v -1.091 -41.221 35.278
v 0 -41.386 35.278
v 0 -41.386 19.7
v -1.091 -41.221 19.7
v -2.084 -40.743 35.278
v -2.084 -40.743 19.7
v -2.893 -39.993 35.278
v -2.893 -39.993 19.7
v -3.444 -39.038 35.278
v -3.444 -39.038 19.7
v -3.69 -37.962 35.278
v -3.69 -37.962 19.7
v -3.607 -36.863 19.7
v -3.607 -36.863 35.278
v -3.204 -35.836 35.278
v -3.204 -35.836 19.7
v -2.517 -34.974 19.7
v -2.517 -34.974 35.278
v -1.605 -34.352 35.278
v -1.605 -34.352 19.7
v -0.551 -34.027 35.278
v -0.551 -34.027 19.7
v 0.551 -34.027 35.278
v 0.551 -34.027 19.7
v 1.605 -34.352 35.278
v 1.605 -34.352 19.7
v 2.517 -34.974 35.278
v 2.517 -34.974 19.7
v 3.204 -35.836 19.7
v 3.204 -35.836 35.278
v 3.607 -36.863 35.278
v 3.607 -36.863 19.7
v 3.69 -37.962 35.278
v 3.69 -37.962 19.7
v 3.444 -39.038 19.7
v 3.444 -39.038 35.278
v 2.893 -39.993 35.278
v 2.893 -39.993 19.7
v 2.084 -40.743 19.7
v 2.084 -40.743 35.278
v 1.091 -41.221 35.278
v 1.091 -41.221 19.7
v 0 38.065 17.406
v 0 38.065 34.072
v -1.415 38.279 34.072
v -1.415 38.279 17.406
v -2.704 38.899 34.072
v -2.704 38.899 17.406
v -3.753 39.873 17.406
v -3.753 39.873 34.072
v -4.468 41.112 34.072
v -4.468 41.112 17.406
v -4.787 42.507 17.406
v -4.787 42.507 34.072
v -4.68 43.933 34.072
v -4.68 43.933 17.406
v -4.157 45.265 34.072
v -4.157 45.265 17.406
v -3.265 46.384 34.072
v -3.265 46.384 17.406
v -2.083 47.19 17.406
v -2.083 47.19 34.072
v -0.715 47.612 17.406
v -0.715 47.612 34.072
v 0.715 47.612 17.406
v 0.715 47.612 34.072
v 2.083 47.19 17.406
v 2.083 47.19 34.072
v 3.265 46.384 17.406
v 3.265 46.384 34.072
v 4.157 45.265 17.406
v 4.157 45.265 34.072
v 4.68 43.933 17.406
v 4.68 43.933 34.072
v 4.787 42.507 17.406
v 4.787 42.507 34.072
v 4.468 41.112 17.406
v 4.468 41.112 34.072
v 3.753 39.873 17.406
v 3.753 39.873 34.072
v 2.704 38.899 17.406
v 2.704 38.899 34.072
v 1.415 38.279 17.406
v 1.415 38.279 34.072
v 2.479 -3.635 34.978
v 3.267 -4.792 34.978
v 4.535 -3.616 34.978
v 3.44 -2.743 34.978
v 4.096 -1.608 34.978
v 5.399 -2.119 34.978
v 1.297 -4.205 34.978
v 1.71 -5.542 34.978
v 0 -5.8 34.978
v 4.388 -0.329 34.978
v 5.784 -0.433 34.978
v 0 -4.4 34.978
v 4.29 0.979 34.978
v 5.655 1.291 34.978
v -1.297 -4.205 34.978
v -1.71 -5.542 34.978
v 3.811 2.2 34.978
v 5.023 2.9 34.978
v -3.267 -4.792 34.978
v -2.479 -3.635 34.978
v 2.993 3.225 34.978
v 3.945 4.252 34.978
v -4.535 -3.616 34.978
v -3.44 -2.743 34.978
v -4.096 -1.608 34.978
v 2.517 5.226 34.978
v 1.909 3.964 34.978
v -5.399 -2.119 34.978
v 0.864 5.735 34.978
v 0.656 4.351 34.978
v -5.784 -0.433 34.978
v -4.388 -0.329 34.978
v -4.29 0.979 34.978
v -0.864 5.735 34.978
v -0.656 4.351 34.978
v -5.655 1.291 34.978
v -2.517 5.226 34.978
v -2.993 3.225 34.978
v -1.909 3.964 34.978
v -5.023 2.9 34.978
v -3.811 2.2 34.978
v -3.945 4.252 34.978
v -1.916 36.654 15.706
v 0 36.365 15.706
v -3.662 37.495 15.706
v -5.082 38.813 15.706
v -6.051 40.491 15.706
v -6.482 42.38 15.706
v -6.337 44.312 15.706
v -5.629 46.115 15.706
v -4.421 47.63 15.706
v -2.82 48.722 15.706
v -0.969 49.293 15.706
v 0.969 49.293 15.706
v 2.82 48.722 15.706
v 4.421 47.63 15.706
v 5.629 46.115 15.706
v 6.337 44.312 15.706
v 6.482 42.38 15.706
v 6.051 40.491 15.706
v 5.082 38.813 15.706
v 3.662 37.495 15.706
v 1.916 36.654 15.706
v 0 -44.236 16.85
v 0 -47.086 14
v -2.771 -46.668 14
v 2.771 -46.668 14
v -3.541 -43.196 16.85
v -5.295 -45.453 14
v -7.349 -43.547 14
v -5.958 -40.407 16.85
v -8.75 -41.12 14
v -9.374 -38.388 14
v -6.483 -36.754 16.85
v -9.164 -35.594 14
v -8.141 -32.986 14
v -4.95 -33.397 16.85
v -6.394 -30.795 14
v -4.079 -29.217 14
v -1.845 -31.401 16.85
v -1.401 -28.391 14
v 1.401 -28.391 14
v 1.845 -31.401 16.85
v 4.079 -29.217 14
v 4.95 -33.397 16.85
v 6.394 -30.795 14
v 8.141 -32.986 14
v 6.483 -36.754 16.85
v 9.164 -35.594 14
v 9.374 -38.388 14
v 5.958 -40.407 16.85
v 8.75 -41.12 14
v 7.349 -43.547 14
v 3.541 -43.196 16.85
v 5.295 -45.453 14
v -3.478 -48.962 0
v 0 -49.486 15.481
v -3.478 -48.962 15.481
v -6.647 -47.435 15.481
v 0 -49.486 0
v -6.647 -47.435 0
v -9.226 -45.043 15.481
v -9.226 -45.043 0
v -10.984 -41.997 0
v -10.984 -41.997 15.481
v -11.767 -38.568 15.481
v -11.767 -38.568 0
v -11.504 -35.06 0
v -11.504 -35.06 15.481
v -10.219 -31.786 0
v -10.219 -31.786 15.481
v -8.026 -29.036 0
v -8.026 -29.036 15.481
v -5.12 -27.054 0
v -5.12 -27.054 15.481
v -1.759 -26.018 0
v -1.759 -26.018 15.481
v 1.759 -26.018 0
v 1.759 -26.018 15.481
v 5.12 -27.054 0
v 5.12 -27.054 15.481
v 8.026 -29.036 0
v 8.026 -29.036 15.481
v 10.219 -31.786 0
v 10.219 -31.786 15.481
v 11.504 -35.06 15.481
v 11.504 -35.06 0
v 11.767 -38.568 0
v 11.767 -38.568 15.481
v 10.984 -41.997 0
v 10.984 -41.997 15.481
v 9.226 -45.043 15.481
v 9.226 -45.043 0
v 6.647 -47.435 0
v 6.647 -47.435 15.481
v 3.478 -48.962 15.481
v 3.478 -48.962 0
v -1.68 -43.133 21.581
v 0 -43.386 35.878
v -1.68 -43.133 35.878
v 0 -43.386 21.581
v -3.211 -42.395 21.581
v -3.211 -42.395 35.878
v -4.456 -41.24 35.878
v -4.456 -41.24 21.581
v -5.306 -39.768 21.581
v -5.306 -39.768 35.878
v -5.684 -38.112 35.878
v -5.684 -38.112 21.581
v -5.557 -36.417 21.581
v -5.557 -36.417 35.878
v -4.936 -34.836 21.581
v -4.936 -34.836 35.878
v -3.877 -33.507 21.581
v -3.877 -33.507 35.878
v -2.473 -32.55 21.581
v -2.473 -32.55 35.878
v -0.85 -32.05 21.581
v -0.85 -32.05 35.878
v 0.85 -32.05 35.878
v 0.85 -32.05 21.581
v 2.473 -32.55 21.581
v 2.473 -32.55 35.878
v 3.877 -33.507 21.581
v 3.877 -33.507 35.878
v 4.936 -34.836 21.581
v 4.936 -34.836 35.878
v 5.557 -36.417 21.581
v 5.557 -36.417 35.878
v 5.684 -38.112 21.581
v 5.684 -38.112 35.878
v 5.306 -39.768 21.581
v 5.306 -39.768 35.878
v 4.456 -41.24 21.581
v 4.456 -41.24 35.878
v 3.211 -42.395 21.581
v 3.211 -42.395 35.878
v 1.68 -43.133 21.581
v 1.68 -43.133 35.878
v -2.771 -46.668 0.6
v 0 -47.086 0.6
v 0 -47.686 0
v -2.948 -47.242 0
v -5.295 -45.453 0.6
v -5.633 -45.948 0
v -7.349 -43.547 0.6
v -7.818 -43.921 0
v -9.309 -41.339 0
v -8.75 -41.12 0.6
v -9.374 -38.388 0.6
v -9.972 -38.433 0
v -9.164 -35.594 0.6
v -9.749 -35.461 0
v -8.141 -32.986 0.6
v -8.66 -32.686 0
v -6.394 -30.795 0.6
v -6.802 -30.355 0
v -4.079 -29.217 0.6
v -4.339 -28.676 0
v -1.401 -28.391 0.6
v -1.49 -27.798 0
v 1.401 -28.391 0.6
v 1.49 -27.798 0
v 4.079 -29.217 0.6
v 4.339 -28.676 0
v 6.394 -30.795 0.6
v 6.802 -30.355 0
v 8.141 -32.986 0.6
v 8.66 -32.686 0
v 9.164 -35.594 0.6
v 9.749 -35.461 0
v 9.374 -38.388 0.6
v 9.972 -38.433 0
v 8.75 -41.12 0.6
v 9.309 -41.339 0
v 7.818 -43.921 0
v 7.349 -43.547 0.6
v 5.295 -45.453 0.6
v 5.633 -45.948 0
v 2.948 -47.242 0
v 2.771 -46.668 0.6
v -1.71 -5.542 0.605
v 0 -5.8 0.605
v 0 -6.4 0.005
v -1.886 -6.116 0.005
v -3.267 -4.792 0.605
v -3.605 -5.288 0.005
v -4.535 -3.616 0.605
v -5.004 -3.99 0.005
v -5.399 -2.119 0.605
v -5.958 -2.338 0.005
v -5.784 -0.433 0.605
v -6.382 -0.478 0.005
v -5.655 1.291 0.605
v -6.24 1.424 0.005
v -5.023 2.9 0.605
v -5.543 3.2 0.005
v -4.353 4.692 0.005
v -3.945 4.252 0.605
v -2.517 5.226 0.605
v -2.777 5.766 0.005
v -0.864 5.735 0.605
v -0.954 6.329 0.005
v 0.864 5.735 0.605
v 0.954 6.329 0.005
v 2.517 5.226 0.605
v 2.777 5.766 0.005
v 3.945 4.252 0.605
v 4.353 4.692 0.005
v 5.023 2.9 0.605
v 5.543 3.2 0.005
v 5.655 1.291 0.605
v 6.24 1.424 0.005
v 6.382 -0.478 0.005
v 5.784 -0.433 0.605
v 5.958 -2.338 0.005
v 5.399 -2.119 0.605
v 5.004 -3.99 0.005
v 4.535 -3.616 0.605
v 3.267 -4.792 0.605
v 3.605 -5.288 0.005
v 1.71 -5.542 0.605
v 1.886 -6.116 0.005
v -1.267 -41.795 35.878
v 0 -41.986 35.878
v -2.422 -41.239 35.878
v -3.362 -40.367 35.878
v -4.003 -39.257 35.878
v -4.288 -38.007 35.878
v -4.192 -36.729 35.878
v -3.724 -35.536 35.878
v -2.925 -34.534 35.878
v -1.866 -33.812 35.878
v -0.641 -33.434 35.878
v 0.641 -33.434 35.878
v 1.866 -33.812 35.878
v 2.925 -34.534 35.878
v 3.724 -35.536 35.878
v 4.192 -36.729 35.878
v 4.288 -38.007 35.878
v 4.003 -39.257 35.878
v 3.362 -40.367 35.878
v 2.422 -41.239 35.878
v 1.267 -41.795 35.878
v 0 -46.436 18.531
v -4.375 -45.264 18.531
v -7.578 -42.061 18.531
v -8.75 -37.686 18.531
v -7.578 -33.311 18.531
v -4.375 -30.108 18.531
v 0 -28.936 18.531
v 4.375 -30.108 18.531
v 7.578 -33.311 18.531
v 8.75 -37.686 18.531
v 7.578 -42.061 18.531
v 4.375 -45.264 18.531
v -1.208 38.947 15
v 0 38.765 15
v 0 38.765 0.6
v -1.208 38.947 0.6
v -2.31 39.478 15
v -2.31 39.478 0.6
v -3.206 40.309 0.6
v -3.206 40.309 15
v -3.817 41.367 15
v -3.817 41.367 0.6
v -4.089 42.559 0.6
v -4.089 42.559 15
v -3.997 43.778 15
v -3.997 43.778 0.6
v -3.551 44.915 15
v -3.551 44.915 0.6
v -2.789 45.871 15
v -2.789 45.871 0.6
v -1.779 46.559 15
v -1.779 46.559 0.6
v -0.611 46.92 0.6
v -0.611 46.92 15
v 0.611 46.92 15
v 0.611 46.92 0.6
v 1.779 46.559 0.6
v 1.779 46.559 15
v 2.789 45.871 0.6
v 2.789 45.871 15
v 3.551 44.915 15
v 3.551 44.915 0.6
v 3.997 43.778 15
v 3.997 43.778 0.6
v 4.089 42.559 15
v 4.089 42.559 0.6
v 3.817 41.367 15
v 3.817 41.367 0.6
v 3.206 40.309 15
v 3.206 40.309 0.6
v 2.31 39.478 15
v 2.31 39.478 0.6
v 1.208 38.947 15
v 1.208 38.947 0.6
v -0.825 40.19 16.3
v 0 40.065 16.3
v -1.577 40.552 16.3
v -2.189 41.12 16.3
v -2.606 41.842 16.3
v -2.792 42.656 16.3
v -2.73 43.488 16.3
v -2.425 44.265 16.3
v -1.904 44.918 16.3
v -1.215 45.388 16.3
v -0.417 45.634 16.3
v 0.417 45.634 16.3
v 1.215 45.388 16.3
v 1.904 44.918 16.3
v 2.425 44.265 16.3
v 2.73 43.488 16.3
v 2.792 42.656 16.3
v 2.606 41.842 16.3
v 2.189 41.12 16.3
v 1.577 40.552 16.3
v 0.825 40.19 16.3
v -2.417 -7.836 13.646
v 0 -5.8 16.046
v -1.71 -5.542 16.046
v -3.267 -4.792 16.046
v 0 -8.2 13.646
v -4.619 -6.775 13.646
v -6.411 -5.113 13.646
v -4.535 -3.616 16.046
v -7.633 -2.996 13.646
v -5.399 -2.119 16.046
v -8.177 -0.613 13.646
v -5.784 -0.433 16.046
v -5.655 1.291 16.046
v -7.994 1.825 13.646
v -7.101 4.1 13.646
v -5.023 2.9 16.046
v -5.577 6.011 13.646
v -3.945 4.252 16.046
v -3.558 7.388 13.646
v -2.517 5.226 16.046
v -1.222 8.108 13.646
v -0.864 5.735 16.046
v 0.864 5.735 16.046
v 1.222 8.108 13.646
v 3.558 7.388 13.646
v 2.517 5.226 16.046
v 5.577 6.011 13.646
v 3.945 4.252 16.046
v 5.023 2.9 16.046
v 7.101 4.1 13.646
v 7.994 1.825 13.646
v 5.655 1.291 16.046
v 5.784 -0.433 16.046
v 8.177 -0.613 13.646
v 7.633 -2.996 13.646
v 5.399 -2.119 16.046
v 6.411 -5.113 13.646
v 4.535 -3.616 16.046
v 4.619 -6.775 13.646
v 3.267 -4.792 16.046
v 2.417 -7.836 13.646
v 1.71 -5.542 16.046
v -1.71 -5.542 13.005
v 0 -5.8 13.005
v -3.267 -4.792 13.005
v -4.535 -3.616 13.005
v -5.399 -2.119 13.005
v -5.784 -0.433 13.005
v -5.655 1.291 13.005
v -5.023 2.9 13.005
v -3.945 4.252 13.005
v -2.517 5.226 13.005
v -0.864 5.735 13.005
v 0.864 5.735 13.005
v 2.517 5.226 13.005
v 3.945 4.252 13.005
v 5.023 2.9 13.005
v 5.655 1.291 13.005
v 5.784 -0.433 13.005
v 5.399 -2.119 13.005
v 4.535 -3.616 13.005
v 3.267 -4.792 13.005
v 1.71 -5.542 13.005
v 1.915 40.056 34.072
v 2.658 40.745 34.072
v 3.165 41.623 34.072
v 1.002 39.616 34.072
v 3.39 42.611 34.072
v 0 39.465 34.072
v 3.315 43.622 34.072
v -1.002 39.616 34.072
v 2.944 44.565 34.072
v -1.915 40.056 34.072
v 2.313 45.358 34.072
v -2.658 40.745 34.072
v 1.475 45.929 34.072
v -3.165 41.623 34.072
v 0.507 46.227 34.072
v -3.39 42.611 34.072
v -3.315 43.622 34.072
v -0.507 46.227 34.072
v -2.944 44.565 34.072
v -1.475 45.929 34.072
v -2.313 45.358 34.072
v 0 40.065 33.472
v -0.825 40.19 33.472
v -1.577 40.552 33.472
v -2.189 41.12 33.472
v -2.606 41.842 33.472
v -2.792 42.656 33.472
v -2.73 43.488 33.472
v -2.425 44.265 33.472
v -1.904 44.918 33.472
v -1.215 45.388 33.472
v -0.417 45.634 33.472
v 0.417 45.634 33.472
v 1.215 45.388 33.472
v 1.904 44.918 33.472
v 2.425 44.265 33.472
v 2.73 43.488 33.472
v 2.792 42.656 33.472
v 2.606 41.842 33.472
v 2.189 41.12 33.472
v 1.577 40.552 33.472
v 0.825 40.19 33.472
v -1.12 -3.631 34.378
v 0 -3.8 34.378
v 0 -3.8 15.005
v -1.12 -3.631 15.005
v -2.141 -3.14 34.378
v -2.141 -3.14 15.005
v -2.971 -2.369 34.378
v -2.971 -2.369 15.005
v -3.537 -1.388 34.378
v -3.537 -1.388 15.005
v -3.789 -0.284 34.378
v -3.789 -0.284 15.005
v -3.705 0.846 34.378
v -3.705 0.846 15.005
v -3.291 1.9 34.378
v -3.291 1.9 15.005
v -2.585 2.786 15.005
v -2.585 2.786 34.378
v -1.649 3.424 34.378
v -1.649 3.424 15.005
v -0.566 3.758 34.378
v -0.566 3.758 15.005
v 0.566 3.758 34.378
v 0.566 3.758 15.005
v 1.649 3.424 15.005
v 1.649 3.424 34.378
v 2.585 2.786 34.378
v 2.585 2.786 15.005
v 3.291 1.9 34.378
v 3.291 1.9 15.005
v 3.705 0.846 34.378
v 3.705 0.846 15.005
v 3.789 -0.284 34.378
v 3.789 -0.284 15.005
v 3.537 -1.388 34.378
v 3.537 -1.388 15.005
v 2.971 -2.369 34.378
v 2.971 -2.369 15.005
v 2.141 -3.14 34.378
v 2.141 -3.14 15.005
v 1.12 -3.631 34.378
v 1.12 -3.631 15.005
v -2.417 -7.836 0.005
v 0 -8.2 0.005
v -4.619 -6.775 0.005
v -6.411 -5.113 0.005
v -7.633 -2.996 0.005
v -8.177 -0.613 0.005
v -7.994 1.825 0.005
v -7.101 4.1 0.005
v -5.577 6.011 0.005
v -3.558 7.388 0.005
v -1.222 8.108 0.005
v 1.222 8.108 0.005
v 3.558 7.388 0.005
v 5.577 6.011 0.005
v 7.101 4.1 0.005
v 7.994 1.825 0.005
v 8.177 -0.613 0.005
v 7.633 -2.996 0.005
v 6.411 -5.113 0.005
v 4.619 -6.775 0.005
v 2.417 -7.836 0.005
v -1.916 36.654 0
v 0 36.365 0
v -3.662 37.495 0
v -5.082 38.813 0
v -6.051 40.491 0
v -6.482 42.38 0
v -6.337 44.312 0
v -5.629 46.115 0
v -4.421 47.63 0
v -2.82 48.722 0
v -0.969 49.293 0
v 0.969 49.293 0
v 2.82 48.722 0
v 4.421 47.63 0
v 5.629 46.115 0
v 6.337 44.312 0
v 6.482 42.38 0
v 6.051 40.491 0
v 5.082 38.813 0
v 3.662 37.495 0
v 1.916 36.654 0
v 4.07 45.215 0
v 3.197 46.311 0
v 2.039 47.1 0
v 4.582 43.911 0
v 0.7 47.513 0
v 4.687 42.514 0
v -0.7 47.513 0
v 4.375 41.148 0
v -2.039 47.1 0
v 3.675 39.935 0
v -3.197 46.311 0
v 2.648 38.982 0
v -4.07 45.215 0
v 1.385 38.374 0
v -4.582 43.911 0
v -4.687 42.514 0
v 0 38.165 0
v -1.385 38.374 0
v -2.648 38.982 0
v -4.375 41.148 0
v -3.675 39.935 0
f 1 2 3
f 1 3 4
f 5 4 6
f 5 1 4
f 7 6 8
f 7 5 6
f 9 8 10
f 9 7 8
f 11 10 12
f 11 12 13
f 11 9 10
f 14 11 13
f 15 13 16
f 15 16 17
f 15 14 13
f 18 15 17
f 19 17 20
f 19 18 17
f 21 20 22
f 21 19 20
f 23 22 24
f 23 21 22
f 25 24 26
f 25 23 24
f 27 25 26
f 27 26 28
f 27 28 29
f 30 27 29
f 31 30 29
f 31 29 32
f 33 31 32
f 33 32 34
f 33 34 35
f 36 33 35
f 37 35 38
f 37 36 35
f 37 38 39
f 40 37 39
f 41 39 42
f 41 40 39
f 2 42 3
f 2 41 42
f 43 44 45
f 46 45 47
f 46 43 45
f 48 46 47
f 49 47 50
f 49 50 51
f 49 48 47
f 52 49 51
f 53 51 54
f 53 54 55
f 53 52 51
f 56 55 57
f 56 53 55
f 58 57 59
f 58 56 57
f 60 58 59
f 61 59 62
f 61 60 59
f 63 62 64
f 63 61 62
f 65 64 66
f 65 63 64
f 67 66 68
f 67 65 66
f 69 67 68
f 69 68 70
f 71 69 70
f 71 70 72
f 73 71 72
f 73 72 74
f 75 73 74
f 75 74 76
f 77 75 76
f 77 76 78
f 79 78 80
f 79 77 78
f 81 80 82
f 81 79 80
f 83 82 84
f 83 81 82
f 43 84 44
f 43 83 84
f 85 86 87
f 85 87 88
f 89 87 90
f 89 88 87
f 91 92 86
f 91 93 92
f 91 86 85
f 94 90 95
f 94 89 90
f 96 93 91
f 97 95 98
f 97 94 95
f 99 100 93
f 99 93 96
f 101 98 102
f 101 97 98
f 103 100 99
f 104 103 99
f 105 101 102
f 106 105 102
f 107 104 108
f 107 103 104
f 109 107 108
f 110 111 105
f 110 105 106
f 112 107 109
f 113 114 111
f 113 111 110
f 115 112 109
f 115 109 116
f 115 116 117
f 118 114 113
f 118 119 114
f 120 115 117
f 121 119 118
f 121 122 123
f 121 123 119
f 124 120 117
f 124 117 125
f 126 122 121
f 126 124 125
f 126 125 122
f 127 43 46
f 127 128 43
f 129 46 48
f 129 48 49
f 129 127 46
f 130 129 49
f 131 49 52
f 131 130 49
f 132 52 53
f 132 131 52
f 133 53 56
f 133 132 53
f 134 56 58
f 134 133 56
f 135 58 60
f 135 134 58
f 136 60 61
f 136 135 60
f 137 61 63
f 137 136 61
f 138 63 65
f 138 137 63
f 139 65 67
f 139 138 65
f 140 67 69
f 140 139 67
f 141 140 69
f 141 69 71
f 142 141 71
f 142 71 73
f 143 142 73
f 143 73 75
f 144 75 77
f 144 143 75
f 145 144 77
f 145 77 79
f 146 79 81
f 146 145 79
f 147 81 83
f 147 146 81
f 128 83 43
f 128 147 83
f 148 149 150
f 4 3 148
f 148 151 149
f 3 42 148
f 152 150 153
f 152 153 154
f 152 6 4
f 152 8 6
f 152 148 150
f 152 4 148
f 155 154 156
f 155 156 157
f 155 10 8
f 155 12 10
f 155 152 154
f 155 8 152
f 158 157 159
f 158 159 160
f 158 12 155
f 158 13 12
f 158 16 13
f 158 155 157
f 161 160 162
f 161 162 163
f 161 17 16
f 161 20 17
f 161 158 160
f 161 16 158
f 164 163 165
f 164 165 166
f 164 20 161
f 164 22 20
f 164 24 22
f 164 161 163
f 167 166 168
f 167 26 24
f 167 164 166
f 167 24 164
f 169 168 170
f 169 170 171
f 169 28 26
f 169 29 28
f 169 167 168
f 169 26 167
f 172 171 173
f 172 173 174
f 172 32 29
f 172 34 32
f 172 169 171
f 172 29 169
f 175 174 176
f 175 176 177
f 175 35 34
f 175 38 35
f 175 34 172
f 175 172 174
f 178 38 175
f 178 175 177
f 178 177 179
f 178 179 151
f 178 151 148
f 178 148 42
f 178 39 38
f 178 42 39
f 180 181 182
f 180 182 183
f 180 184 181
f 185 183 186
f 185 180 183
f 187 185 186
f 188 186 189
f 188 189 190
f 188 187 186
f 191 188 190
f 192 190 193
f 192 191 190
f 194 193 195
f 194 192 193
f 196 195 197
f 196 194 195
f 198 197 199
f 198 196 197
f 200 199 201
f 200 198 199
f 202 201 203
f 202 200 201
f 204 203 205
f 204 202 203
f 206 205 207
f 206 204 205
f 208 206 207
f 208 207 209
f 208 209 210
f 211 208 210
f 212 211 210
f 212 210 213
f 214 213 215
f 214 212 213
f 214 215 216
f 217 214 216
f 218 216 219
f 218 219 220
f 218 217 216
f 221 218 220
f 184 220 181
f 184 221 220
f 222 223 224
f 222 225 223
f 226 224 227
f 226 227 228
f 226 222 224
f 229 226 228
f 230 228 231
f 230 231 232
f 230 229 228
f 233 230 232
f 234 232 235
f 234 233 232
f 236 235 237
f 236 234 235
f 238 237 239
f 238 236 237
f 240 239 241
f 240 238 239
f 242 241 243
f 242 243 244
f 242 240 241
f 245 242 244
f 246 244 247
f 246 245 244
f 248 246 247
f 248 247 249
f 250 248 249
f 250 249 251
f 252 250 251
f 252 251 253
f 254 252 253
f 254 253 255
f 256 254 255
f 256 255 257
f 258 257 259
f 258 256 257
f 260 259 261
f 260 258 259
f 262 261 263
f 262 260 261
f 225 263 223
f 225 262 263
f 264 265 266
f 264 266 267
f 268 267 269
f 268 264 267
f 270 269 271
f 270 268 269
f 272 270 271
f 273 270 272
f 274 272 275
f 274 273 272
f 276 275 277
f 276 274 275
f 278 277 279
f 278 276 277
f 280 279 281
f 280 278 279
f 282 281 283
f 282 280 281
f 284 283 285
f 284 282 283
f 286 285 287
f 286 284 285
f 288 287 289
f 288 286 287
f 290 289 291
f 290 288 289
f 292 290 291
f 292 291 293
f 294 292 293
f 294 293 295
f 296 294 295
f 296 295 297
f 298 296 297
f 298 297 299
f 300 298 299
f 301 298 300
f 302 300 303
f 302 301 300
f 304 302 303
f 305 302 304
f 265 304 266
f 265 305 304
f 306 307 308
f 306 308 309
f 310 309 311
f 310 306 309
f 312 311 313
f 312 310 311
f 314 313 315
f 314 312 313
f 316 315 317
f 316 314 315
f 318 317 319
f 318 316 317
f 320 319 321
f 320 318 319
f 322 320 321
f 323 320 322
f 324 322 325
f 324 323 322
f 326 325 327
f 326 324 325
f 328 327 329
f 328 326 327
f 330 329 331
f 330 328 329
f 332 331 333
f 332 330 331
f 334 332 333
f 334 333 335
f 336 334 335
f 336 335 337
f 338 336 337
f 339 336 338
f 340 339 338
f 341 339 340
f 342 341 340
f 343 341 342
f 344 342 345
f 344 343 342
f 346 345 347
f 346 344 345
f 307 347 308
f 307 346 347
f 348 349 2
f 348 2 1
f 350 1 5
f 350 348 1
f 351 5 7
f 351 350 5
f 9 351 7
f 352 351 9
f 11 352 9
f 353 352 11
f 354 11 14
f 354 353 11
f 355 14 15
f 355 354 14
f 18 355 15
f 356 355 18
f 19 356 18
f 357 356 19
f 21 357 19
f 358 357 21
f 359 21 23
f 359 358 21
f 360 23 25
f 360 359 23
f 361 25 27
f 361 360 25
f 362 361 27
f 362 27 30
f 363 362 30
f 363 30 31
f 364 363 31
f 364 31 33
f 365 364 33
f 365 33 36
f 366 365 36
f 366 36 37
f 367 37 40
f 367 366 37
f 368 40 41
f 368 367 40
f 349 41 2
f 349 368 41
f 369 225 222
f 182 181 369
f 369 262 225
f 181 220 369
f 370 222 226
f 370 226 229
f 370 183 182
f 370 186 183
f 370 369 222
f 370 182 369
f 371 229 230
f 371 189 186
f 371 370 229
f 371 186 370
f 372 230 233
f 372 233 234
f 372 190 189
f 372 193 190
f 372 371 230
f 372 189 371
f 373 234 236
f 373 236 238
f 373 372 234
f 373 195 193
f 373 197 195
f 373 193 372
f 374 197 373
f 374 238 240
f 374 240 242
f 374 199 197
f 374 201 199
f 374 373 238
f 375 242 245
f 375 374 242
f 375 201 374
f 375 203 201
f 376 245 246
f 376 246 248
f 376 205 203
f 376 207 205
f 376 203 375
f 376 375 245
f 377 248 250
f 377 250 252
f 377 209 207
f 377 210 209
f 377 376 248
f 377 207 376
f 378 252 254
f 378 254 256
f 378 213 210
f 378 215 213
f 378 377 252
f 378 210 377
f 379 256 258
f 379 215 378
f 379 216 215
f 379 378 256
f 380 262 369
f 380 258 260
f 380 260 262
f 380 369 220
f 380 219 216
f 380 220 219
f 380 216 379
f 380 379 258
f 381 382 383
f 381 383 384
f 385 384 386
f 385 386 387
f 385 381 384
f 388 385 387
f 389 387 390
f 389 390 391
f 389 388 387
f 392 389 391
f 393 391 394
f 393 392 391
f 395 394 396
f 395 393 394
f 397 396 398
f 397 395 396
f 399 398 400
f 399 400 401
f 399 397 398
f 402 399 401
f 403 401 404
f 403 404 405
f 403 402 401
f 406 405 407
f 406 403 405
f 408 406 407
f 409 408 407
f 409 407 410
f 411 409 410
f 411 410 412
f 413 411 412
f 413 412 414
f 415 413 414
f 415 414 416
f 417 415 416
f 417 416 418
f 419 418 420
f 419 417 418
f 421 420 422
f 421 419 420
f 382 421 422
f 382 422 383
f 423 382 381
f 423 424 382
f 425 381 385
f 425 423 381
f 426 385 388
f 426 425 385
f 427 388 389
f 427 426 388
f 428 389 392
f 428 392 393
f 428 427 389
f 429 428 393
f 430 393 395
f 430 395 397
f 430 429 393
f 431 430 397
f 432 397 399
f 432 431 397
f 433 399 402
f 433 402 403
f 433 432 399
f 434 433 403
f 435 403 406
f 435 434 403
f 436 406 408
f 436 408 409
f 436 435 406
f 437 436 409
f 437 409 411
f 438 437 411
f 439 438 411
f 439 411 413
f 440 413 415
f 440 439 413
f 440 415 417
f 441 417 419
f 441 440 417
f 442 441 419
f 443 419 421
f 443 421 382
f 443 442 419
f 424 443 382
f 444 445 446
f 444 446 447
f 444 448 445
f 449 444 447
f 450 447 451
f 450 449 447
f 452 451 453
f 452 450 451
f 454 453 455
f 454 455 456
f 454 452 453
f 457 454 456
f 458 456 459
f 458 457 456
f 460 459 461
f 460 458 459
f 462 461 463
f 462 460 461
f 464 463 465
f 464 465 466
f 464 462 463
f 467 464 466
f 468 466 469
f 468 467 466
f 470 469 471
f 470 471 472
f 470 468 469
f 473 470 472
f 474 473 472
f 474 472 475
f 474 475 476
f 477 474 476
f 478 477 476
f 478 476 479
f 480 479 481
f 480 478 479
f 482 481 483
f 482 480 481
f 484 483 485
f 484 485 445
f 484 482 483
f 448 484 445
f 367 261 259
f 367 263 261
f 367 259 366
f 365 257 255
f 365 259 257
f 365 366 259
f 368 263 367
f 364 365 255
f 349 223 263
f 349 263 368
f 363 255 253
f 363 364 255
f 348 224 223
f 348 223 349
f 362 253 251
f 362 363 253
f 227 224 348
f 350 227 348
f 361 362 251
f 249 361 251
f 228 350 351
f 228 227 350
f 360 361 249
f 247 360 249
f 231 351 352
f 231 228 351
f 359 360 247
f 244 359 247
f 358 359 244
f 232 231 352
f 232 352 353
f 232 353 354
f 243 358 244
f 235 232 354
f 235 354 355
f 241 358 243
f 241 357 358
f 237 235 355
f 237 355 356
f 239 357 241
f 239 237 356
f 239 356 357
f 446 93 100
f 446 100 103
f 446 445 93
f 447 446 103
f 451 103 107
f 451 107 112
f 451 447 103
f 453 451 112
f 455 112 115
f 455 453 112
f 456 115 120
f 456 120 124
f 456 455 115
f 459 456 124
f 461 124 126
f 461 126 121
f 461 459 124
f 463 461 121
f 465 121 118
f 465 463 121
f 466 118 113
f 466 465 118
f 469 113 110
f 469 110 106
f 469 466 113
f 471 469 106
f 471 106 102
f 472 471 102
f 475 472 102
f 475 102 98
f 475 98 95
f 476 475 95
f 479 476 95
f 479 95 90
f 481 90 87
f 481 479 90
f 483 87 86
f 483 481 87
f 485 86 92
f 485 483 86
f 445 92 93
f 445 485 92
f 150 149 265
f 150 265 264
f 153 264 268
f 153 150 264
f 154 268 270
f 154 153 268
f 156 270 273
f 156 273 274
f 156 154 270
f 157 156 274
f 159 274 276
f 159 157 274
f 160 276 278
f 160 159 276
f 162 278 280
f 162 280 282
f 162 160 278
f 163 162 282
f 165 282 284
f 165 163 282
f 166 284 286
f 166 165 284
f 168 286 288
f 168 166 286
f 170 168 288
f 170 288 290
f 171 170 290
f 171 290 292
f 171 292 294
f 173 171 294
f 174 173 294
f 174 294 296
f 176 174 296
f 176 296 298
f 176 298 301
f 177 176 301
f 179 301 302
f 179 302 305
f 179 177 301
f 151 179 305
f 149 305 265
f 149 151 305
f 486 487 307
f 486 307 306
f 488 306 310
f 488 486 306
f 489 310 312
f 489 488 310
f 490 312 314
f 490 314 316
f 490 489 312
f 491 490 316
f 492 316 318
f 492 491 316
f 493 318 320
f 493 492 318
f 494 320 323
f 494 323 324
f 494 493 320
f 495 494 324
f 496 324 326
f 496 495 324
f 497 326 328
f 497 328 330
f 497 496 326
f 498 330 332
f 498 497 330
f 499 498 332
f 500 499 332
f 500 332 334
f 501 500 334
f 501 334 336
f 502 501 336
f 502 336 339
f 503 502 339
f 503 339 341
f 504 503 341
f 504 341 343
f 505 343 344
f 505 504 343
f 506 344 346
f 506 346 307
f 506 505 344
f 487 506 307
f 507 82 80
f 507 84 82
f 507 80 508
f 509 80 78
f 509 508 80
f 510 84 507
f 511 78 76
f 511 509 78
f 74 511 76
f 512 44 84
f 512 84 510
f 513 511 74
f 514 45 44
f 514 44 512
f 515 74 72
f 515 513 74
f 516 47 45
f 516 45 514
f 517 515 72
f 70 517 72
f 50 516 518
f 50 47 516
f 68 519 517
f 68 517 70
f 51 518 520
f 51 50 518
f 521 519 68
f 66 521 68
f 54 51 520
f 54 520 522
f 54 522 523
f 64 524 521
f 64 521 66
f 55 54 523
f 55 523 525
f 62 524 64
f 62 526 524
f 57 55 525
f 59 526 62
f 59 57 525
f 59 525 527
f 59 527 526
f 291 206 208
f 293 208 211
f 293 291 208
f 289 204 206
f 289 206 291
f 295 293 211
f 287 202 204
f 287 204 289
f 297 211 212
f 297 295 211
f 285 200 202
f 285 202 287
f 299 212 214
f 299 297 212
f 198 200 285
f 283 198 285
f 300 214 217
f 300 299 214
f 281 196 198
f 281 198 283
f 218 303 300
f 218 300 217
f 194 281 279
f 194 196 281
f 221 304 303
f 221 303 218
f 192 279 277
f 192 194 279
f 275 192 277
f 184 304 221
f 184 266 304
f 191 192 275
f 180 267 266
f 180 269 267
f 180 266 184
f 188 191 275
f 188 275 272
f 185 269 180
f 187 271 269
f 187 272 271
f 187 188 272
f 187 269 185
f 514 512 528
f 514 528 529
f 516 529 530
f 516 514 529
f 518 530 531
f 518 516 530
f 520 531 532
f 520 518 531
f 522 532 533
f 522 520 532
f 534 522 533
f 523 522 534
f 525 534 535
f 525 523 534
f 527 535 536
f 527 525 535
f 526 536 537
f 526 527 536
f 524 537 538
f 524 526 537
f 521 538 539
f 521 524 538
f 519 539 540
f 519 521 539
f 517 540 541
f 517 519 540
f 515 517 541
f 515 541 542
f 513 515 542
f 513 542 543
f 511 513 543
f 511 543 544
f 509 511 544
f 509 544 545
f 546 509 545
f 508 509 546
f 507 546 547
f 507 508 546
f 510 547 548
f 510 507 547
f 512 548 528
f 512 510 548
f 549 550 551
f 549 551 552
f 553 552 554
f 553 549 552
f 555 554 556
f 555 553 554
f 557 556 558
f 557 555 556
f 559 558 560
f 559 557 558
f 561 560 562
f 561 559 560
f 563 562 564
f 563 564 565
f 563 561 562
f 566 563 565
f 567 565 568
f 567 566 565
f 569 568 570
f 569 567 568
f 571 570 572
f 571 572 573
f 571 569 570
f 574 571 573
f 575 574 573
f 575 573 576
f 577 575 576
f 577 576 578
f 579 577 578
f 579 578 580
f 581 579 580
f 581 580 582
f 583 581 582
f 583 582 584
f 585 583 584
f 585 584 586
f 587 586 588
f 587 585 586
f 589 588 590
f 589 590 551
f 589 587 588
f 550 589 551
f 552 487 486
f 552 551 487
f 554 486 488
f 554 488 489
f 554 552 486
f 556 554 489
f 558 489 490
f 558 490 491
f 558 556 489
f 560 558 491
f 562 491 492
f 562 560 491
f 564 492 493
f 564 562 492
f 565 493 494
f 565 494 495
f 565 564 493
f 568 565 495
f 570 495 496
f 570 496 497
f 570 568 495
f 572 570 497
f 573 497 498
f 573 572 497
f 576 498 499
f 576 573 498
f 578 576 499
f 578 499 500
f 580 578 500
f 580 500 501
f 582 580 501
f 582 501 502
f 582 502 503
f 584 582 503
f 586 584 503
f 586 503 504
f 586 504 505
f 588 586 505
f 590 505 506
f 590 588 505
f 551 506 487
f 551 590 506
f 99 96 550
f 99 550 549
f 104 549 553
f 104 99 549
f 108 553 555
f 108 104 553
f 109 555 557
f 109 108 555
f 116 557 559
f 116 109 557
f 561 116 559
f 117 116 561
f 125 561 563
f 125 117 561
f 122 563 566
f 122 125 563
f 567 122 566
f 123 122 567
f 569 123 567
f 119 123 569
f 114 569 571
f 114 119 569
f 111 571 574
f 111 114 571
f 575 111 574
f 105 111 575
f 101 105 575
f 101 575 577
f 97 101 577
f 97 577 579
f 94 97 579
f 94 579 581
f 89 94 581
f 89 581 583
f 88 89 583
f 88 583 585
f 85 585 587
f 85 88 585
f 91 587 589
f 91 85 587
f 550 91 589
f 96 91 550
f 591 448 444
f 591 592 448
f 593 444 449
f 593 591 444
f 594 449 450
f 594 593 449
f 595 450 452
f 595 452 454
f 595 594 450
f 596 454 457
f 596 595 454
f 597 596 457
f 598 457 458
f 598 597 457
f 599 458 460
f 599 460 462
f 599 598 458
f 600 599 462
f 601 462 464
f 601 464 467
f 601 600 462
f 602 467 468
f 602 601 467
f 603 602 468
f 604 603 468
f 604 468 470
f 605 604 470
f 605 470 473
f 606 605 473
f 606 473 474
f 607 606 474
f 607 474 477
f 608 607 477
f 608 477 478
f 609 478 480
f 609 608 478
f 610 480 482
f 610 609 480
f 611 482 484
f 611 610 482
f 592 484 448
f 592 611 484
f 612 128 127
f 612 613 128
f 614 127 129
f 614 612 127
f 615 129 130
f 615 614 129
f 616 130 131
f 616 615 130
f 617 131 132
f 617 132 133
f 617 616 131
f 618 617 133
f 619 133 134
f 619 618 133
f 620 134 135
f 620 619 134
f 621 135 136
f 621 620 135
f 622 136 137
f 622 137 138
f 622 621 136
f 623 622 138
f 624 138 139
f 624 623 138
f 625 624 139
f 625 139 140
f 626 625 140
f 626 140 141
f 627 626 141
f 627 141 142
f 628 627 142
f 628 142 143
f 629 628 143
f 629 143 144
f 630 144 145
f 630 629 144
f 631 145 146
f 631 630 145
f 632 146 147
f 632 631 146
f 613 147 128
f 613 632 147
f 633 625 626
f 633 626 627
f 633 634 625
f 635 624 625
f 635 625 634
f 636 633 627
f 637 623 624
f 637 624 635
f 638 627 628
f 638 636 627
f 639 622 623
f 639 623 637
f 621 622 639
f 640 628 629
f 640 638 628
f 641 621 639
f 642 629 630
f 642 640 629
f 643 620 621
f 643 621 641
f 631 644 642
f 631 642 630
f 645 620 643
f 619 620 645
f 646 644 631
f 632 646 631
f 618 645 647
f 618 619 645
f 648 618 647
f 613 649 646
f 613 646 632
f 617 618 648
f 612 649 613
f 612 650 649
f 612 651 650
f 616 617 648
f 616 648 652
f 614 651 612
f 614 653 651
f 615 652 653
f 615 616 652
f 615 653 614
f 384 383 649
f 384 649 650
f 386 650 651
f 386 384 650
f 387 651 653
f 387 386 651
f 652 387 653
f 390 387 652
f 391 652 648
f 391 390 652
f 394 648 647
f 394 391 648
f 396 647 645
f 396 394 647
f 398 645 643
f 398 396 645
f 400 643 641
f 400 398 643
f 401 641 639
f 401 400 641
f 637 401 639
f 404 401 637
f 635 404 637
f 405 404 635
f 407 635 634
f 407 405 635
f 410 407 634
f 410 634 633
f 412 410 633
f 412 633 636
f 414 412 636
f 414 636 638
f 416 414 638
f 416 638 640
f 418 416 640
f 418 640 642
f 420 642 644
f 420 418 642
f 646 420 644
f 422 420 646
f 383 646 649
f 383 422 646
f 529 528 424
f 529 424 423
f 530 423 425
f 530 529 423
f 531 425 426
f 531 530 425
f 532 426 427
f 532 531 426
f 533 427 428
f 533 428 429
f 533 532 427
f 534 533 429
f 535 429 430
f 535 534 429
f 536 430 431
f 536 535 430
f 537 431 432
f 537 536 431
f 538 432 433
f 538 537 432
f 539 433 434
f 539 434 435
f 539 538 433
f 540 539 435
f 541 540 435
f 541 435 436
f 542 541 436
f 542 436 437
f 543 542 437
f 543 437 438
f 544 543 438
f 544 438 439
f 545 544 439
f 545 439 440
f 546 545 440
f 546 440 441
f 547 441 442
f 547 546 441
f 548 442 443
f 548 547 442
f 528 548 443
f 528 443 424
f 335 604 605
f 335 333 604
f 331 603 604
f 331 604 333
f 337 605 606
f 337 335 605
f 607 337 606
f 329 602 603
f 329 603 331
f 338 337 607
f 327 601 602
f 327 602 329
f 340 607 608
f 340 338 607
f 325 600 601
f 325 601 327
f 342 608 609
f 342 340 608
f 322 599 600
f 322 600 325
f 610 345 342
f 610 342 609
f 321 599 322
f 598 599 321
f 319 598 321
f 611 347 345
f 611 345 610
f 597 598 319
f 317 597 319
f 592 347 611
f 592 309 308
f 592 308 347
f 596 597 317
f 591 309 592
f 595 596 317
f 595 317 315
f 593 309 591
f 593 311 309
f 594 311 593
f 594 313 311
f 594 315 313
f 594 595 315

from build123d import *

# Parameters (mm, degrees)
F4_SIZE   = 0.6
F4_2_SIZE = 0.6
F4_3_SIZE = 0.6


with BuildPart() as f1:
    # F0 (on Right) → F1 (revolve)
    with BuildSketch(Plane.YZ):
        Polygon((-8.2, 0.0052660612), (-5.8, 0.0052660612), (-5.8, 13.0052660612), (-3.8, 15.0052660612), (-3.8, 34.9776267817), (-5.8, 34.9776267817), (-5.8, 16.0460362283), (-8.2, 13.6460362283), align=None)
    revolve(axis=Axis((0, 0, 5.2408409514), (0, 0, -1)))

    # F4
    f4_edges = [f1.edges().sort_by_distance(p)[0] for p in [
        (0, 5.8, 0.005266),
        (0, 3.8, 34.977627),
    ]]
    chamfer(f4_edges, length=F4_SIZE)


with BuildPart() as f2:
    # F0 (on Right) → F2 (revolve)
    with BuildSketch(Plane.YZ):
        Polygon((36.3653332472, 0), (38.7653332472, 0), (38.7653332472, 15), (40.0653332472, 16.3), (40.0653332472, 34.0719968081), (38.0653332472, 34.0719968081), (38.0653332472, 17.4058965415), (36.3653332472, 15.7058965415), align=None)
    revolve(axis=Axis((0, 42.8653332472, 8.6921965703), (0, 0, -1)))

    # F4#2
    f4_2_edges = [f2.edges().sort_by_distance(p)[0] for p in [
        (0, 46.965333, 0),
        (0, 45.665333, 34.071997),
    ]]
    chamfer(f4_2_edges, length=F4_2_SIZE)


with BuildPart() as f3:
    # F0 (on Right) → F3 (revolve)
    with BuildSketch(Plane.YZ):
        Polygon((-49.4858663619, 0), (-47.0858663619, 0), (-47.0858663619, 14), (-41.3858663619, 19.7), (-41.3858663619, 35.8776268103), (-43.3858663619, 35.8776268103), (-43.3858663619, 21.5810506761), (-49.4858663619, 15.4810506761), align=None)
    revolve(axis=Axis((0, -37.6858663619, 16.0833399966), (0, 0, -1)))

    # F4#3
    f4_3_edges = [f3.edges().sort_by_distance(p)[0] for p in [
        (0, -33.985866, 35.877627),
        (0, -28.285866, 0),
    ]]
    chamfer(f4_3_edges, length=F4_3_SIZE)


solid = Compound([f1.part, f2.part, f3.part])
